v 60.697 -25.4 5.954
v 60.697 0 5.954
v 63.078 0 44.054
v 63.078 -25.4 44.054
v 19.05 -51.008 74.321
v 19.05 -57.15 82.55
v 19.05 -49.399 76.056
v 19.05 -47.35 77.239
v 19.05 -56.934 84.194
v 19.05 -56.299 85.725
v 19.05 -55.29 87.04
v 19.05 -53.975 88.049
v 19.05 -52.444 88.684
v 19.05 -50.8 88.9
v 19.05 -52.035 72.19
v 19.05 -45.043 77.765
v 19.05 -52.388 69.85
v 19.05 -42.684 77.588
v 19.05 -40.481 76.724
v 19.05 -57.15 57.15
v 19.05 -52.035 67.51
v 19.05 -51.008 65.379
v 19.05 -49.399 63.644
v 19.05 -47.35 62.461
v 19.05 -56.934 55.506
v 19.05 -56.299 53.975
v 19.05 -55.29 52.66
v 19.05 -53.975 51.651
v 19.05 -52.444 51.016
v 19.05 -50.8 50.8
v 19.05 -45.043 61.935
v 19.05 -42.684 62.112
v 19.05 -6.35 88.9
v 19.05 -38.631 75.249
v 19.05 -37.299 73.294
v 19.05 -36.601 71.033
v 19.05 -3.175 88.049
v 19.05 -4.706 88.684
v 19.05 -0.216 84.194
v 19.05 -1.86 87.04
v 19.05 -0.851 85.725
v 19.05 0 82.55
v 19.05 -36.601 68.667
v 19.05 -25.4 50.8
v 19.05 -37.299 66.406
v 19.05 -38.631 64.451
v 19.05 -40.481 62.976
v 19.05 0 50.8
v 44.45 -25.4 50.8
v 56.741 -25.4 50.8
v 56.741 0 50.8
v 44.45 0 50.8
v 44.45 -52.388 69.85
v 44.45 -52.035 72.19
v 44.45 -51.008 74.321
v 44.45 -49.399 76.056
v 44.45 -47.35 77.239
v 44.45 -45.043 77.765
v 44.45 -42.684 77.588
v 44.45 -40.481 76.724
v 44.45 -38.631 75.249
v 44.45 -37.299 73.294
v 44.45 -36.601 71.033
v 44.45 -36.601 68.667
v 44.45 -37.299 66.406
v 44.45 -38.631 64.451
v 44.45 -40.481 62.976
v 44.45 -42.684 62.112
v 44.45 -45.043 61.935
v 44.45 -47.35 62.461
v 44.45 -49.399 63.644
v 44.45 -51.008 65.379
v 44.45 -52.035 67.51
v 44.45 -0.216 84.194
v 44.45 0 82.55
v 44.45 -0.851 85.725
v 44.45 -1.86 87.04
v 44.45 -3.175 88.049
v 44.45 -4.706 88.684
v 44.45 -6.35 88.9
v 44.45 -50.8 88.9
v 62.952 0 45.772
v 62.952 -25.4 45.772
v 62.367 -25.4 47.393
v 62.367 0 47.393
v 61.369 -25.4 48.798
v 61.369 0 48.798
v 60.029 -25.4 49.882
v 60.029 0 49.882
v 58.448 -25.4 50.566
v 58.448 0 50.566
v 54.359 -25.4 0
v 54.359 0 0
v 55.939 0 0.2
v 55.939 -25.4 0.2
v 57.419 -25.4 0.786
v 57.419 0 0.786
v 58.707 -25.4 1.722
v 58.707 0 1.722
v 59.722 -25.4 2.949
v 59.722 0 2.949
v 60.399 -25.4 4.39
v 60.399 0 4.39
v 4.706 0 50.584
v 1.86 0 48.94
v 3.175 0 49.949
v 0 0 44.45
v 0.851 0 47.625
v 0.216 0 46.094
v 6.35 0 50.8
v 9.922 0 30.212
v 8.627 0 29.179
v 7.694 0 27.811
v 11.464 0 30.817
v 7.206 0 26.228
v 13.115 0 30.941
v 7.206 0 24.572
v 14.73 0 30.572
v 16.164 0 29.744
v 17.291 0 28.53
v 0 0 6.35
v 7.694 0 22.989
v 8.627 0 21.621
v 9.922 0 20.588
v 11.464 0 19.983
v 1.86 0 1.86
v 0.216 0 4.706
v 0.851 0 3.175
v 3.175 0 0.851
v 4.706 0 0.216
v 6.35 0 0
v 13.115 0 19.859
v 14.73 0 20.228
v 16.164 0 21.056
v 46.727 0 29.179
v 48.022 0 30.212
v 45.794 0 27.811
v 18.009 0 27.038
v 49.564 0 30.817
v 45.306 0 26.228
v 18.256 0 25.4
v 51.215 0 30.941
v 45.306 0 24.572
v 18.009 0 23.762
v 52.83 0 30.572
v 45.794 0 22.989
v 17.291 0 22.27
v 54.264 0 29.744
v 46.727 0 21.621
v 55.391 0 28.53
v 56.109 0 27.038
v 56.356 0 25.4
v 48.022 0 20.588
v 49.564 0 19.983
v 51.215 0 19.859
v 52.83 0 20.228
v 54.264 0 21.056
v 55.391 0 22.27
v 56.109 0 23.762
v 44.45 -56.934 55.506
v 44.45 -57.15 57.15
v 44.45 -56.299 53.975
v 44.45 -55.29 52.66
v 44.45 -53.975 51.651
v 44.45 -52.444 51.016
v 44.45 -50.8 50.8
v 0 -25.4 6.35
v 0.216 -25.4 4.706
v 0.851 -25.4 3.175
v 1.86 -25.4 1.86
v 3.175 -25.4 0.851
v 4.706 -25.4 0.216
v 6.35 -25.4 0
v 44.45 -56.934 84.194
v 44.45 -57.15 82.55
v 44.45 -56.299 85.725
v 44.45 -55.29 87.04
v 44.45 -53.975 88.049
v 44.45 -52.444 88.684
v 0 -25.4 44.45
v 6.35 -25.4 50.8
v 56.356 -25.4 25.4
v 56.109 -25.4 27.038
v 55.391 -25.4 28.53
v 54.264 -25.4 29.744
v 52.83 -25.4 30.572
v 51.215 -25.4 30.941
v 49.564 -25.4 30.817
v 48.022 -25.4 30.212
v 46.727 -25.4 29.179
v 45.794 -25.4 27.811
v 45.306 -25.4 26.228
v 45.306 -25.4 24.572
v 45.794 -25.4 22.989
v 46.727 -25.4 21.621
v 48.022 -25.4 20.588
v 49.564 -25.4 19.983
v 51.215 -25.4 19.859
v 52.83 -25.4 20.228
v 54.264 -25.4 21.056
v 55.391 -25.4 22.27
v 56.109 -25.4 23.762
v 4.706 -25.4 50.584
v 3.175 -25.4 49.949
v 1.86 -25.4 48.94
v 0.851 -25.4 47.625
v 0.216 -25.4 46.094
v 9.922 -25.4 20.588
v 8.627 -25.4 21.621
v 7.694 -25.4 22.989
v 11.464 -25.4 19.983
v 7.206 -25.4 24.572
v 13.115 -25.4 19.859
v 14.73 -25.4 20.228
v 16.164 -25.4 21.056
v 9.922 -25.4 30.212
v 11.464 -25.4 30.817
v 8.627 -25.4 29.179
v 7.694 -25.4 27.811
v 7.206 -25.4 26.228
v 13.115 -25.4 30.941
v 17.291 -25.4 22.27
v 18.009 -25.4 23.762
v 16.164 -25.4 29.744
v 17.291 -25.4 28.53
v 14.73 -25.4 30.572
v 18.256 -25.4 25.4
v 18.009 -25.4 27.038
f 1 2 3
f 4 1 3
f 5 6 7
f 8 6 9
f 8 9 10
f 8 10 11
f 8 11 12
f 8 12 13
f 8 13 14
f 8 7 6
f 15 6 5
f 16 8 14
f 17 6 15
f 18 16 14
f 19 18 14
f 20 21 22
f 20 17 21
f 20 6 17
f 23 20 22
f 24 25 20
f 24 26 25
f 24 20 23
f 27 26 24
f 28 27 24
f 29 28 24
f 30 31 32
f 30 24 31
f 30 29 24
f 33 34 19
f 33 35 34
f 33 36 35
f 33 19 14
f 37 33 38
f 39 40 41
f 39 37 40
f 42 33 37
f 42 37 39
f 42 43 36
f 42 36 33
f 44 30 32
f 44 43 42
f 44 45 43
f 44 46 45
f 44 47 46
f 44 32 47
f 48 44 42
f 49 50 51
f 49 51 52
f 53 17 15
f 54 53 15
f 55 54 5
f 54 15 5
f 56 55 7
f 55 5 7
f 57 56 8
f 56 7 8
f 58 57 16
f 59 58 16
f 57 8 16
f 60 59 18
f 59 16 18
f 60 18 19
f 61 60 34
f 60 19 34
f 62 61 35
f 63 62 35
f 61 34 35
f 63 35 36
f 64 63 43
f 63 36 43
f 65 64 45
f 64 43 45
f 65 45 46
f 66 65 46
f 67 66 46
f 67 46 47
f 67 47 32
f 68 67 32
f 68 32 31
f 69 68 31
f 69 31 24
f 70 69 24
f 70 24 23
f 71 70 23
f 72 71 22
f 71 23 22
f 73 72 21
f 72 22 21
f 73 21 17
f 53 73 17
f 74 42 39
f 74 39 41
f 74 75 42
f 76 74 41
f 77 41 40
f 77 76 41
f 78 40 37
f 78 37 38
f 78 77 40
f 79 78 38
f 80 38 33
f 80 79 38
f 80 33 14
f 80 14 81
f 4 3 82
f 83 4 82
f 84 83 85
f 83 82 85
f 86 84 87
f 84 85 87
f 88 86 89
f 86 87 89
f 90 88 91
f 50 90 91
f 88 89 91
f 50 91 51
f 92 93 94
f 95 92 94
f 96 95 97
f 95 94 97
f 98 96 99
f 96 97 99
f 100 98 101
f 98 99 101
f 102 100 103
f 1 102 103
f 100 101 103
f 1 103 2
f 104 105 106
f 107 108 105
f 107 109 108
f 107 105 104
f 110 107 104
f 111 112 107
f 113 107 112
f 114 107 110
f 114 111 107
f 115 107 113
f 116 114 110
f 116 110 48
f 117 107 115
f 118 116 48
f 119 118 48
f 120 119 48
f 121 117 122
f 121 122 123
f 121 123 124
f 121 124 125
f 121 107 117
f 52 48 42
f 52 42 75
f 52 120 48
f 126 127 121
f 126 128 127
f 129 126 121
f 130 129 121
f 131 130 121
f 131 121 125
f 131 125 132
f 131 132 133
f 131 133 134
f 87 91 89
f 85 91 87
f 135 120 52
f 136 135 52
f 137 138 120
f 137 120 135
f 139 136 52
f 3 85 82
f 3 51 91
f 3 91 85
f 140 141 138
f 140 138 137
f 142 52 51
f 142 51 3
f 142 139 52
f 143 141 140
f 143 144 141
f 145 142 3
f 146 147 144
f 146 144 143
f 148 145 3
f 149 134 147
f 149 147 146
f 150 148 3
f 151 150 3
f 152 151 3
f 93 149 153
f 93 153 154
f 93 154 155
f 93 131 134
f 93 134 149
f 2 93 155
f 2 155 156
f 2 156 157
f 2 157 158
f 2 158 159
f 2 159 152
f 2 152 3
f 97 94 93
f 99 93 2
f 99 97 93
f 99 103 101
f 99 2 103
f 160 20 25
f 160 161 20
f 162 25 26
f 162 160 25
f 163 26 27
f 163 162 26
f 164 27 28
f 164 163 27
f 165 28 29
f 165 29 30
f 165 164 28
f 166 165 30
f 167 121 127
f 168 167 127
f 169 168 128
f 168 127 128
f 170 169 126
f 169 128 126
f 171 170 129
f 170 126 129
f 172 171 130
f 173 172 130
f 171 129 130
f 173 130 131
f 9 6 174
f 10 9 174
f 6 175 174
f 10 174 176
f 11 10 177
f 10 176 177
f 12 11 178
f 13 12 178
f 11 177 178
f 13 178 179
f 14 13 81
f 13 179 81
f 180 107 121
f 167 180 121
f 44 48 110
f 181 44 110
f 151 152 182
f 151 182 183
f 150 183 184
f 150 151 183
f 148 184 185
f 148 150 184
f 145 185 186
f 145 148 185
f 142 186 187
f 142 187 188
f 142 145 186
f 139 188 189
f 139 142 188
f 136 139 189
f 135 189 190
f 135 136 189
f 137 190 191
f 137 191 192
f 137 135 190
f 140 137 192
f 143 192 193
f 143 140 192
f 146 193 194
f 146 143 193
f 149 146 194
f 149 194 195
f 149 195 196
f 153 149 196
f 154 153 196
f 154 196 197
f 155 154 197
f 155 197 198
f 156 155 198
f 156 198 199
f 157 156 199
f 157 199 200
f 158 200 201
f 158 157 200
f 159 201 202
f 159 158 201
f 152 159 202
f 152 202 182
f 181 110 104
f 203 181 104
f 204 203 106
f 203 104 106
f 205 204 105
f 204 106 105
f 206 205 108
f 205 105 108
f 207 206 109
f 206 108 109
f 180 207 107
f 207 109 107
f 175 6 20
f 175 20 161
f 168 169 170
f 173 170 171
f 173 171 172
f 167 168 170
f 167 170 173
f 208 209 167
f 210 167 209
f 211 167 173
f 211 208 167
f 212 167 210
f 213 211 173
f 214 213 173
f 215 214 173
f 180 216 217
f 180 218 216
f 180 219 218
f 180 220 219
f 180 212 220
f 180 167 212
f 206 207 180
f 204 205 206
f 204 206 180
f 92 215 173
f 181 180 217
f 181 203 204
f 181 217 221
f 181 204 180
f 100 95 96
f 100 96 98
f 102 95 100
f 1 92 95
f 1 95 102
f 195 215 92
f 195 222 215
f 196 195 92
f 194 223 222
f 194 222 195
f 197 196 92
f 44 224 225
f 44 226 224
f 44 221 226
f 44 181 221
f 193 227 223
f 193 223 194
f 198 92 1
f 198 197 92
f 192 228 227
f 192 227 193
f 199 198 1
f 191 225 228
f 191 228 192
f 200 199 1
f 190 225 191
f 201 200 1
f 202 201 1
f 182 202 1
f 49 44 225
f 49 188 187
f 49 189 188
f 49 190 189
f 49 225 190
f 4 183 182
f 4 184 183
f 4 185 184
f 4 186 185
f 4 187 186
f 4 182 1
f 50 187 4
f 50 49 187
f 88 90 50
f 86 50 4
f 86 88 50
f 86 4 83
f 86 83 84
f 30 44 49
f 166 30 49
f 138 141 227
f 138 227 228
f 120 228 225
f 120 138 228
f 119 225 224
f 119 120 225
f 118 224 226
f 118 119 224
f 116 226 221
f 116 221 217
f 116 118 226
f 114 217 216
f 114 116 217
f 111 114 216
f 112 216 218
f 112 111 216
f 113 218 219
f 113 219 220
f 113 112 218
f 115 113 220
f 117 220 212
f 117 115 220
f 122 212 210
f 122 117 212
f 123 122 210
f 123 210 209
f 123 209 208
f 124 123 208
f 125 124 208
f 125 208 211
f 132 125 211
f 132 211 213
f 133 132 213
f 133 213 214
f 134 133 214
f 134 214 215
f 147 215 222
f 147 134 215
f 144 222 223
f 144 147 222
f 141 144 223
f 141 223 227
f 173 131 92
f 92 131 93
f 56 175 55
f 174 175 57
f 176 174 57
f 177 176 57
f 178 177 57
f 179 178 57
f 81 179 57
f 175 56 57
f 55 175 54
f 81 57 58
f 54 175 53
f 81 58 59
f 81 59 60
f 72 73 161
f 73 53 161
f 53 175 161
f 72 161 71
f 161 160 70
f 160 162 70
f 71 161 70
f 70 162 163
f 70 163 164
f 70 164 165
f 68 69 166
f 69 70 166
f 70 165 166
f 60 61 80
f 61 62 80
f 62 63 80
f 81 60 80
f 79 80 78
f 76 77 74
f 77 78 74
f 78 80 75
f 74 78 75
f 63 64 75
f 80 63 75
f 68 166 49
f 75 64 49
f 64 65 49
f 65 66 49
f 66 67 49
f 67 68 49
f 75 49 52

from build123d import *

# Parameters (mm, degrees)
F0_R     = 5.55625
F1_DEPTH = 25.4
F2_W     = 25.4
F2_H     = 57.15
F3_DEPTH = 38.1
F4_R     = 6.35
F5_R     = 7.9375
F6_DEPTH = 25.4


with BuildPart() as f1:
    # F0 (on Front) → F1 (new body)
    with BuildSketch(Plane.XZ):
        with BuildLine():
            ThreePointArc((0, 6.35), (1.859872, 1.859872), (6.35, 0))
            Line((6.35, 0), (54.359485, 0))
            ThreePointArc((54.359485, 0), (58.707315, 1.721947), (60.697119, 5.953898))
            Line((60.697119, 5.953898), (63.078369, 44.053898))
            ThreePointArc((63.078369, 44.053898), (61.368788, 48.79783), (56.740735, 50.8))
            Line((56.740735, 50.8), (6.35, 50.8))
            ThreePointArc((6.35, 50.8), (1.859872, 48.940128), (0, 44.45))
            Line((0, 44.45), (0, 6.35))
        make_face()
        with Locations((12.7, 25.4)):
            Circle(F0_R, mode=Mode.SUBTRACT)
        with Locations((50.8, 25.4)):
            Circle(F0_R, mode=Mode.SUBTRACT)
    extrude(amount=F1_DEPTH)

    # F2 (on face) → F3 (join)
    with BuildSketch(Plane.XY.offset(50.8)):
        with Locations((31.75, -28.575)):
            Rectangle(F2_W, F2_H)
    extrude(amount=F3_DEPTH)

    # F4
    f4_edges = [f1.edges().sort_by_distance(p)[0] for p in [
        (31.75, -57.15, 88.9),
        (31.75, -57.15, 50.8),
        (31.75, 0, 88.9),
    ]]
    fillet(f4_edges, radius=F4_R)

    # F5 (on face) → F6 (cut)
    with BuildSketch(Plane(origin=(19.05, 0, 0), x_dir=(0, -1, 0), z_dir=(-1, 0, 0))):
        with Locations((44.45, 69.85)):
            Circle(F5_R)
    extrude(amount=-F6_DEPTH, mode=Mode.SUBTRACT)


solid = f1.part
